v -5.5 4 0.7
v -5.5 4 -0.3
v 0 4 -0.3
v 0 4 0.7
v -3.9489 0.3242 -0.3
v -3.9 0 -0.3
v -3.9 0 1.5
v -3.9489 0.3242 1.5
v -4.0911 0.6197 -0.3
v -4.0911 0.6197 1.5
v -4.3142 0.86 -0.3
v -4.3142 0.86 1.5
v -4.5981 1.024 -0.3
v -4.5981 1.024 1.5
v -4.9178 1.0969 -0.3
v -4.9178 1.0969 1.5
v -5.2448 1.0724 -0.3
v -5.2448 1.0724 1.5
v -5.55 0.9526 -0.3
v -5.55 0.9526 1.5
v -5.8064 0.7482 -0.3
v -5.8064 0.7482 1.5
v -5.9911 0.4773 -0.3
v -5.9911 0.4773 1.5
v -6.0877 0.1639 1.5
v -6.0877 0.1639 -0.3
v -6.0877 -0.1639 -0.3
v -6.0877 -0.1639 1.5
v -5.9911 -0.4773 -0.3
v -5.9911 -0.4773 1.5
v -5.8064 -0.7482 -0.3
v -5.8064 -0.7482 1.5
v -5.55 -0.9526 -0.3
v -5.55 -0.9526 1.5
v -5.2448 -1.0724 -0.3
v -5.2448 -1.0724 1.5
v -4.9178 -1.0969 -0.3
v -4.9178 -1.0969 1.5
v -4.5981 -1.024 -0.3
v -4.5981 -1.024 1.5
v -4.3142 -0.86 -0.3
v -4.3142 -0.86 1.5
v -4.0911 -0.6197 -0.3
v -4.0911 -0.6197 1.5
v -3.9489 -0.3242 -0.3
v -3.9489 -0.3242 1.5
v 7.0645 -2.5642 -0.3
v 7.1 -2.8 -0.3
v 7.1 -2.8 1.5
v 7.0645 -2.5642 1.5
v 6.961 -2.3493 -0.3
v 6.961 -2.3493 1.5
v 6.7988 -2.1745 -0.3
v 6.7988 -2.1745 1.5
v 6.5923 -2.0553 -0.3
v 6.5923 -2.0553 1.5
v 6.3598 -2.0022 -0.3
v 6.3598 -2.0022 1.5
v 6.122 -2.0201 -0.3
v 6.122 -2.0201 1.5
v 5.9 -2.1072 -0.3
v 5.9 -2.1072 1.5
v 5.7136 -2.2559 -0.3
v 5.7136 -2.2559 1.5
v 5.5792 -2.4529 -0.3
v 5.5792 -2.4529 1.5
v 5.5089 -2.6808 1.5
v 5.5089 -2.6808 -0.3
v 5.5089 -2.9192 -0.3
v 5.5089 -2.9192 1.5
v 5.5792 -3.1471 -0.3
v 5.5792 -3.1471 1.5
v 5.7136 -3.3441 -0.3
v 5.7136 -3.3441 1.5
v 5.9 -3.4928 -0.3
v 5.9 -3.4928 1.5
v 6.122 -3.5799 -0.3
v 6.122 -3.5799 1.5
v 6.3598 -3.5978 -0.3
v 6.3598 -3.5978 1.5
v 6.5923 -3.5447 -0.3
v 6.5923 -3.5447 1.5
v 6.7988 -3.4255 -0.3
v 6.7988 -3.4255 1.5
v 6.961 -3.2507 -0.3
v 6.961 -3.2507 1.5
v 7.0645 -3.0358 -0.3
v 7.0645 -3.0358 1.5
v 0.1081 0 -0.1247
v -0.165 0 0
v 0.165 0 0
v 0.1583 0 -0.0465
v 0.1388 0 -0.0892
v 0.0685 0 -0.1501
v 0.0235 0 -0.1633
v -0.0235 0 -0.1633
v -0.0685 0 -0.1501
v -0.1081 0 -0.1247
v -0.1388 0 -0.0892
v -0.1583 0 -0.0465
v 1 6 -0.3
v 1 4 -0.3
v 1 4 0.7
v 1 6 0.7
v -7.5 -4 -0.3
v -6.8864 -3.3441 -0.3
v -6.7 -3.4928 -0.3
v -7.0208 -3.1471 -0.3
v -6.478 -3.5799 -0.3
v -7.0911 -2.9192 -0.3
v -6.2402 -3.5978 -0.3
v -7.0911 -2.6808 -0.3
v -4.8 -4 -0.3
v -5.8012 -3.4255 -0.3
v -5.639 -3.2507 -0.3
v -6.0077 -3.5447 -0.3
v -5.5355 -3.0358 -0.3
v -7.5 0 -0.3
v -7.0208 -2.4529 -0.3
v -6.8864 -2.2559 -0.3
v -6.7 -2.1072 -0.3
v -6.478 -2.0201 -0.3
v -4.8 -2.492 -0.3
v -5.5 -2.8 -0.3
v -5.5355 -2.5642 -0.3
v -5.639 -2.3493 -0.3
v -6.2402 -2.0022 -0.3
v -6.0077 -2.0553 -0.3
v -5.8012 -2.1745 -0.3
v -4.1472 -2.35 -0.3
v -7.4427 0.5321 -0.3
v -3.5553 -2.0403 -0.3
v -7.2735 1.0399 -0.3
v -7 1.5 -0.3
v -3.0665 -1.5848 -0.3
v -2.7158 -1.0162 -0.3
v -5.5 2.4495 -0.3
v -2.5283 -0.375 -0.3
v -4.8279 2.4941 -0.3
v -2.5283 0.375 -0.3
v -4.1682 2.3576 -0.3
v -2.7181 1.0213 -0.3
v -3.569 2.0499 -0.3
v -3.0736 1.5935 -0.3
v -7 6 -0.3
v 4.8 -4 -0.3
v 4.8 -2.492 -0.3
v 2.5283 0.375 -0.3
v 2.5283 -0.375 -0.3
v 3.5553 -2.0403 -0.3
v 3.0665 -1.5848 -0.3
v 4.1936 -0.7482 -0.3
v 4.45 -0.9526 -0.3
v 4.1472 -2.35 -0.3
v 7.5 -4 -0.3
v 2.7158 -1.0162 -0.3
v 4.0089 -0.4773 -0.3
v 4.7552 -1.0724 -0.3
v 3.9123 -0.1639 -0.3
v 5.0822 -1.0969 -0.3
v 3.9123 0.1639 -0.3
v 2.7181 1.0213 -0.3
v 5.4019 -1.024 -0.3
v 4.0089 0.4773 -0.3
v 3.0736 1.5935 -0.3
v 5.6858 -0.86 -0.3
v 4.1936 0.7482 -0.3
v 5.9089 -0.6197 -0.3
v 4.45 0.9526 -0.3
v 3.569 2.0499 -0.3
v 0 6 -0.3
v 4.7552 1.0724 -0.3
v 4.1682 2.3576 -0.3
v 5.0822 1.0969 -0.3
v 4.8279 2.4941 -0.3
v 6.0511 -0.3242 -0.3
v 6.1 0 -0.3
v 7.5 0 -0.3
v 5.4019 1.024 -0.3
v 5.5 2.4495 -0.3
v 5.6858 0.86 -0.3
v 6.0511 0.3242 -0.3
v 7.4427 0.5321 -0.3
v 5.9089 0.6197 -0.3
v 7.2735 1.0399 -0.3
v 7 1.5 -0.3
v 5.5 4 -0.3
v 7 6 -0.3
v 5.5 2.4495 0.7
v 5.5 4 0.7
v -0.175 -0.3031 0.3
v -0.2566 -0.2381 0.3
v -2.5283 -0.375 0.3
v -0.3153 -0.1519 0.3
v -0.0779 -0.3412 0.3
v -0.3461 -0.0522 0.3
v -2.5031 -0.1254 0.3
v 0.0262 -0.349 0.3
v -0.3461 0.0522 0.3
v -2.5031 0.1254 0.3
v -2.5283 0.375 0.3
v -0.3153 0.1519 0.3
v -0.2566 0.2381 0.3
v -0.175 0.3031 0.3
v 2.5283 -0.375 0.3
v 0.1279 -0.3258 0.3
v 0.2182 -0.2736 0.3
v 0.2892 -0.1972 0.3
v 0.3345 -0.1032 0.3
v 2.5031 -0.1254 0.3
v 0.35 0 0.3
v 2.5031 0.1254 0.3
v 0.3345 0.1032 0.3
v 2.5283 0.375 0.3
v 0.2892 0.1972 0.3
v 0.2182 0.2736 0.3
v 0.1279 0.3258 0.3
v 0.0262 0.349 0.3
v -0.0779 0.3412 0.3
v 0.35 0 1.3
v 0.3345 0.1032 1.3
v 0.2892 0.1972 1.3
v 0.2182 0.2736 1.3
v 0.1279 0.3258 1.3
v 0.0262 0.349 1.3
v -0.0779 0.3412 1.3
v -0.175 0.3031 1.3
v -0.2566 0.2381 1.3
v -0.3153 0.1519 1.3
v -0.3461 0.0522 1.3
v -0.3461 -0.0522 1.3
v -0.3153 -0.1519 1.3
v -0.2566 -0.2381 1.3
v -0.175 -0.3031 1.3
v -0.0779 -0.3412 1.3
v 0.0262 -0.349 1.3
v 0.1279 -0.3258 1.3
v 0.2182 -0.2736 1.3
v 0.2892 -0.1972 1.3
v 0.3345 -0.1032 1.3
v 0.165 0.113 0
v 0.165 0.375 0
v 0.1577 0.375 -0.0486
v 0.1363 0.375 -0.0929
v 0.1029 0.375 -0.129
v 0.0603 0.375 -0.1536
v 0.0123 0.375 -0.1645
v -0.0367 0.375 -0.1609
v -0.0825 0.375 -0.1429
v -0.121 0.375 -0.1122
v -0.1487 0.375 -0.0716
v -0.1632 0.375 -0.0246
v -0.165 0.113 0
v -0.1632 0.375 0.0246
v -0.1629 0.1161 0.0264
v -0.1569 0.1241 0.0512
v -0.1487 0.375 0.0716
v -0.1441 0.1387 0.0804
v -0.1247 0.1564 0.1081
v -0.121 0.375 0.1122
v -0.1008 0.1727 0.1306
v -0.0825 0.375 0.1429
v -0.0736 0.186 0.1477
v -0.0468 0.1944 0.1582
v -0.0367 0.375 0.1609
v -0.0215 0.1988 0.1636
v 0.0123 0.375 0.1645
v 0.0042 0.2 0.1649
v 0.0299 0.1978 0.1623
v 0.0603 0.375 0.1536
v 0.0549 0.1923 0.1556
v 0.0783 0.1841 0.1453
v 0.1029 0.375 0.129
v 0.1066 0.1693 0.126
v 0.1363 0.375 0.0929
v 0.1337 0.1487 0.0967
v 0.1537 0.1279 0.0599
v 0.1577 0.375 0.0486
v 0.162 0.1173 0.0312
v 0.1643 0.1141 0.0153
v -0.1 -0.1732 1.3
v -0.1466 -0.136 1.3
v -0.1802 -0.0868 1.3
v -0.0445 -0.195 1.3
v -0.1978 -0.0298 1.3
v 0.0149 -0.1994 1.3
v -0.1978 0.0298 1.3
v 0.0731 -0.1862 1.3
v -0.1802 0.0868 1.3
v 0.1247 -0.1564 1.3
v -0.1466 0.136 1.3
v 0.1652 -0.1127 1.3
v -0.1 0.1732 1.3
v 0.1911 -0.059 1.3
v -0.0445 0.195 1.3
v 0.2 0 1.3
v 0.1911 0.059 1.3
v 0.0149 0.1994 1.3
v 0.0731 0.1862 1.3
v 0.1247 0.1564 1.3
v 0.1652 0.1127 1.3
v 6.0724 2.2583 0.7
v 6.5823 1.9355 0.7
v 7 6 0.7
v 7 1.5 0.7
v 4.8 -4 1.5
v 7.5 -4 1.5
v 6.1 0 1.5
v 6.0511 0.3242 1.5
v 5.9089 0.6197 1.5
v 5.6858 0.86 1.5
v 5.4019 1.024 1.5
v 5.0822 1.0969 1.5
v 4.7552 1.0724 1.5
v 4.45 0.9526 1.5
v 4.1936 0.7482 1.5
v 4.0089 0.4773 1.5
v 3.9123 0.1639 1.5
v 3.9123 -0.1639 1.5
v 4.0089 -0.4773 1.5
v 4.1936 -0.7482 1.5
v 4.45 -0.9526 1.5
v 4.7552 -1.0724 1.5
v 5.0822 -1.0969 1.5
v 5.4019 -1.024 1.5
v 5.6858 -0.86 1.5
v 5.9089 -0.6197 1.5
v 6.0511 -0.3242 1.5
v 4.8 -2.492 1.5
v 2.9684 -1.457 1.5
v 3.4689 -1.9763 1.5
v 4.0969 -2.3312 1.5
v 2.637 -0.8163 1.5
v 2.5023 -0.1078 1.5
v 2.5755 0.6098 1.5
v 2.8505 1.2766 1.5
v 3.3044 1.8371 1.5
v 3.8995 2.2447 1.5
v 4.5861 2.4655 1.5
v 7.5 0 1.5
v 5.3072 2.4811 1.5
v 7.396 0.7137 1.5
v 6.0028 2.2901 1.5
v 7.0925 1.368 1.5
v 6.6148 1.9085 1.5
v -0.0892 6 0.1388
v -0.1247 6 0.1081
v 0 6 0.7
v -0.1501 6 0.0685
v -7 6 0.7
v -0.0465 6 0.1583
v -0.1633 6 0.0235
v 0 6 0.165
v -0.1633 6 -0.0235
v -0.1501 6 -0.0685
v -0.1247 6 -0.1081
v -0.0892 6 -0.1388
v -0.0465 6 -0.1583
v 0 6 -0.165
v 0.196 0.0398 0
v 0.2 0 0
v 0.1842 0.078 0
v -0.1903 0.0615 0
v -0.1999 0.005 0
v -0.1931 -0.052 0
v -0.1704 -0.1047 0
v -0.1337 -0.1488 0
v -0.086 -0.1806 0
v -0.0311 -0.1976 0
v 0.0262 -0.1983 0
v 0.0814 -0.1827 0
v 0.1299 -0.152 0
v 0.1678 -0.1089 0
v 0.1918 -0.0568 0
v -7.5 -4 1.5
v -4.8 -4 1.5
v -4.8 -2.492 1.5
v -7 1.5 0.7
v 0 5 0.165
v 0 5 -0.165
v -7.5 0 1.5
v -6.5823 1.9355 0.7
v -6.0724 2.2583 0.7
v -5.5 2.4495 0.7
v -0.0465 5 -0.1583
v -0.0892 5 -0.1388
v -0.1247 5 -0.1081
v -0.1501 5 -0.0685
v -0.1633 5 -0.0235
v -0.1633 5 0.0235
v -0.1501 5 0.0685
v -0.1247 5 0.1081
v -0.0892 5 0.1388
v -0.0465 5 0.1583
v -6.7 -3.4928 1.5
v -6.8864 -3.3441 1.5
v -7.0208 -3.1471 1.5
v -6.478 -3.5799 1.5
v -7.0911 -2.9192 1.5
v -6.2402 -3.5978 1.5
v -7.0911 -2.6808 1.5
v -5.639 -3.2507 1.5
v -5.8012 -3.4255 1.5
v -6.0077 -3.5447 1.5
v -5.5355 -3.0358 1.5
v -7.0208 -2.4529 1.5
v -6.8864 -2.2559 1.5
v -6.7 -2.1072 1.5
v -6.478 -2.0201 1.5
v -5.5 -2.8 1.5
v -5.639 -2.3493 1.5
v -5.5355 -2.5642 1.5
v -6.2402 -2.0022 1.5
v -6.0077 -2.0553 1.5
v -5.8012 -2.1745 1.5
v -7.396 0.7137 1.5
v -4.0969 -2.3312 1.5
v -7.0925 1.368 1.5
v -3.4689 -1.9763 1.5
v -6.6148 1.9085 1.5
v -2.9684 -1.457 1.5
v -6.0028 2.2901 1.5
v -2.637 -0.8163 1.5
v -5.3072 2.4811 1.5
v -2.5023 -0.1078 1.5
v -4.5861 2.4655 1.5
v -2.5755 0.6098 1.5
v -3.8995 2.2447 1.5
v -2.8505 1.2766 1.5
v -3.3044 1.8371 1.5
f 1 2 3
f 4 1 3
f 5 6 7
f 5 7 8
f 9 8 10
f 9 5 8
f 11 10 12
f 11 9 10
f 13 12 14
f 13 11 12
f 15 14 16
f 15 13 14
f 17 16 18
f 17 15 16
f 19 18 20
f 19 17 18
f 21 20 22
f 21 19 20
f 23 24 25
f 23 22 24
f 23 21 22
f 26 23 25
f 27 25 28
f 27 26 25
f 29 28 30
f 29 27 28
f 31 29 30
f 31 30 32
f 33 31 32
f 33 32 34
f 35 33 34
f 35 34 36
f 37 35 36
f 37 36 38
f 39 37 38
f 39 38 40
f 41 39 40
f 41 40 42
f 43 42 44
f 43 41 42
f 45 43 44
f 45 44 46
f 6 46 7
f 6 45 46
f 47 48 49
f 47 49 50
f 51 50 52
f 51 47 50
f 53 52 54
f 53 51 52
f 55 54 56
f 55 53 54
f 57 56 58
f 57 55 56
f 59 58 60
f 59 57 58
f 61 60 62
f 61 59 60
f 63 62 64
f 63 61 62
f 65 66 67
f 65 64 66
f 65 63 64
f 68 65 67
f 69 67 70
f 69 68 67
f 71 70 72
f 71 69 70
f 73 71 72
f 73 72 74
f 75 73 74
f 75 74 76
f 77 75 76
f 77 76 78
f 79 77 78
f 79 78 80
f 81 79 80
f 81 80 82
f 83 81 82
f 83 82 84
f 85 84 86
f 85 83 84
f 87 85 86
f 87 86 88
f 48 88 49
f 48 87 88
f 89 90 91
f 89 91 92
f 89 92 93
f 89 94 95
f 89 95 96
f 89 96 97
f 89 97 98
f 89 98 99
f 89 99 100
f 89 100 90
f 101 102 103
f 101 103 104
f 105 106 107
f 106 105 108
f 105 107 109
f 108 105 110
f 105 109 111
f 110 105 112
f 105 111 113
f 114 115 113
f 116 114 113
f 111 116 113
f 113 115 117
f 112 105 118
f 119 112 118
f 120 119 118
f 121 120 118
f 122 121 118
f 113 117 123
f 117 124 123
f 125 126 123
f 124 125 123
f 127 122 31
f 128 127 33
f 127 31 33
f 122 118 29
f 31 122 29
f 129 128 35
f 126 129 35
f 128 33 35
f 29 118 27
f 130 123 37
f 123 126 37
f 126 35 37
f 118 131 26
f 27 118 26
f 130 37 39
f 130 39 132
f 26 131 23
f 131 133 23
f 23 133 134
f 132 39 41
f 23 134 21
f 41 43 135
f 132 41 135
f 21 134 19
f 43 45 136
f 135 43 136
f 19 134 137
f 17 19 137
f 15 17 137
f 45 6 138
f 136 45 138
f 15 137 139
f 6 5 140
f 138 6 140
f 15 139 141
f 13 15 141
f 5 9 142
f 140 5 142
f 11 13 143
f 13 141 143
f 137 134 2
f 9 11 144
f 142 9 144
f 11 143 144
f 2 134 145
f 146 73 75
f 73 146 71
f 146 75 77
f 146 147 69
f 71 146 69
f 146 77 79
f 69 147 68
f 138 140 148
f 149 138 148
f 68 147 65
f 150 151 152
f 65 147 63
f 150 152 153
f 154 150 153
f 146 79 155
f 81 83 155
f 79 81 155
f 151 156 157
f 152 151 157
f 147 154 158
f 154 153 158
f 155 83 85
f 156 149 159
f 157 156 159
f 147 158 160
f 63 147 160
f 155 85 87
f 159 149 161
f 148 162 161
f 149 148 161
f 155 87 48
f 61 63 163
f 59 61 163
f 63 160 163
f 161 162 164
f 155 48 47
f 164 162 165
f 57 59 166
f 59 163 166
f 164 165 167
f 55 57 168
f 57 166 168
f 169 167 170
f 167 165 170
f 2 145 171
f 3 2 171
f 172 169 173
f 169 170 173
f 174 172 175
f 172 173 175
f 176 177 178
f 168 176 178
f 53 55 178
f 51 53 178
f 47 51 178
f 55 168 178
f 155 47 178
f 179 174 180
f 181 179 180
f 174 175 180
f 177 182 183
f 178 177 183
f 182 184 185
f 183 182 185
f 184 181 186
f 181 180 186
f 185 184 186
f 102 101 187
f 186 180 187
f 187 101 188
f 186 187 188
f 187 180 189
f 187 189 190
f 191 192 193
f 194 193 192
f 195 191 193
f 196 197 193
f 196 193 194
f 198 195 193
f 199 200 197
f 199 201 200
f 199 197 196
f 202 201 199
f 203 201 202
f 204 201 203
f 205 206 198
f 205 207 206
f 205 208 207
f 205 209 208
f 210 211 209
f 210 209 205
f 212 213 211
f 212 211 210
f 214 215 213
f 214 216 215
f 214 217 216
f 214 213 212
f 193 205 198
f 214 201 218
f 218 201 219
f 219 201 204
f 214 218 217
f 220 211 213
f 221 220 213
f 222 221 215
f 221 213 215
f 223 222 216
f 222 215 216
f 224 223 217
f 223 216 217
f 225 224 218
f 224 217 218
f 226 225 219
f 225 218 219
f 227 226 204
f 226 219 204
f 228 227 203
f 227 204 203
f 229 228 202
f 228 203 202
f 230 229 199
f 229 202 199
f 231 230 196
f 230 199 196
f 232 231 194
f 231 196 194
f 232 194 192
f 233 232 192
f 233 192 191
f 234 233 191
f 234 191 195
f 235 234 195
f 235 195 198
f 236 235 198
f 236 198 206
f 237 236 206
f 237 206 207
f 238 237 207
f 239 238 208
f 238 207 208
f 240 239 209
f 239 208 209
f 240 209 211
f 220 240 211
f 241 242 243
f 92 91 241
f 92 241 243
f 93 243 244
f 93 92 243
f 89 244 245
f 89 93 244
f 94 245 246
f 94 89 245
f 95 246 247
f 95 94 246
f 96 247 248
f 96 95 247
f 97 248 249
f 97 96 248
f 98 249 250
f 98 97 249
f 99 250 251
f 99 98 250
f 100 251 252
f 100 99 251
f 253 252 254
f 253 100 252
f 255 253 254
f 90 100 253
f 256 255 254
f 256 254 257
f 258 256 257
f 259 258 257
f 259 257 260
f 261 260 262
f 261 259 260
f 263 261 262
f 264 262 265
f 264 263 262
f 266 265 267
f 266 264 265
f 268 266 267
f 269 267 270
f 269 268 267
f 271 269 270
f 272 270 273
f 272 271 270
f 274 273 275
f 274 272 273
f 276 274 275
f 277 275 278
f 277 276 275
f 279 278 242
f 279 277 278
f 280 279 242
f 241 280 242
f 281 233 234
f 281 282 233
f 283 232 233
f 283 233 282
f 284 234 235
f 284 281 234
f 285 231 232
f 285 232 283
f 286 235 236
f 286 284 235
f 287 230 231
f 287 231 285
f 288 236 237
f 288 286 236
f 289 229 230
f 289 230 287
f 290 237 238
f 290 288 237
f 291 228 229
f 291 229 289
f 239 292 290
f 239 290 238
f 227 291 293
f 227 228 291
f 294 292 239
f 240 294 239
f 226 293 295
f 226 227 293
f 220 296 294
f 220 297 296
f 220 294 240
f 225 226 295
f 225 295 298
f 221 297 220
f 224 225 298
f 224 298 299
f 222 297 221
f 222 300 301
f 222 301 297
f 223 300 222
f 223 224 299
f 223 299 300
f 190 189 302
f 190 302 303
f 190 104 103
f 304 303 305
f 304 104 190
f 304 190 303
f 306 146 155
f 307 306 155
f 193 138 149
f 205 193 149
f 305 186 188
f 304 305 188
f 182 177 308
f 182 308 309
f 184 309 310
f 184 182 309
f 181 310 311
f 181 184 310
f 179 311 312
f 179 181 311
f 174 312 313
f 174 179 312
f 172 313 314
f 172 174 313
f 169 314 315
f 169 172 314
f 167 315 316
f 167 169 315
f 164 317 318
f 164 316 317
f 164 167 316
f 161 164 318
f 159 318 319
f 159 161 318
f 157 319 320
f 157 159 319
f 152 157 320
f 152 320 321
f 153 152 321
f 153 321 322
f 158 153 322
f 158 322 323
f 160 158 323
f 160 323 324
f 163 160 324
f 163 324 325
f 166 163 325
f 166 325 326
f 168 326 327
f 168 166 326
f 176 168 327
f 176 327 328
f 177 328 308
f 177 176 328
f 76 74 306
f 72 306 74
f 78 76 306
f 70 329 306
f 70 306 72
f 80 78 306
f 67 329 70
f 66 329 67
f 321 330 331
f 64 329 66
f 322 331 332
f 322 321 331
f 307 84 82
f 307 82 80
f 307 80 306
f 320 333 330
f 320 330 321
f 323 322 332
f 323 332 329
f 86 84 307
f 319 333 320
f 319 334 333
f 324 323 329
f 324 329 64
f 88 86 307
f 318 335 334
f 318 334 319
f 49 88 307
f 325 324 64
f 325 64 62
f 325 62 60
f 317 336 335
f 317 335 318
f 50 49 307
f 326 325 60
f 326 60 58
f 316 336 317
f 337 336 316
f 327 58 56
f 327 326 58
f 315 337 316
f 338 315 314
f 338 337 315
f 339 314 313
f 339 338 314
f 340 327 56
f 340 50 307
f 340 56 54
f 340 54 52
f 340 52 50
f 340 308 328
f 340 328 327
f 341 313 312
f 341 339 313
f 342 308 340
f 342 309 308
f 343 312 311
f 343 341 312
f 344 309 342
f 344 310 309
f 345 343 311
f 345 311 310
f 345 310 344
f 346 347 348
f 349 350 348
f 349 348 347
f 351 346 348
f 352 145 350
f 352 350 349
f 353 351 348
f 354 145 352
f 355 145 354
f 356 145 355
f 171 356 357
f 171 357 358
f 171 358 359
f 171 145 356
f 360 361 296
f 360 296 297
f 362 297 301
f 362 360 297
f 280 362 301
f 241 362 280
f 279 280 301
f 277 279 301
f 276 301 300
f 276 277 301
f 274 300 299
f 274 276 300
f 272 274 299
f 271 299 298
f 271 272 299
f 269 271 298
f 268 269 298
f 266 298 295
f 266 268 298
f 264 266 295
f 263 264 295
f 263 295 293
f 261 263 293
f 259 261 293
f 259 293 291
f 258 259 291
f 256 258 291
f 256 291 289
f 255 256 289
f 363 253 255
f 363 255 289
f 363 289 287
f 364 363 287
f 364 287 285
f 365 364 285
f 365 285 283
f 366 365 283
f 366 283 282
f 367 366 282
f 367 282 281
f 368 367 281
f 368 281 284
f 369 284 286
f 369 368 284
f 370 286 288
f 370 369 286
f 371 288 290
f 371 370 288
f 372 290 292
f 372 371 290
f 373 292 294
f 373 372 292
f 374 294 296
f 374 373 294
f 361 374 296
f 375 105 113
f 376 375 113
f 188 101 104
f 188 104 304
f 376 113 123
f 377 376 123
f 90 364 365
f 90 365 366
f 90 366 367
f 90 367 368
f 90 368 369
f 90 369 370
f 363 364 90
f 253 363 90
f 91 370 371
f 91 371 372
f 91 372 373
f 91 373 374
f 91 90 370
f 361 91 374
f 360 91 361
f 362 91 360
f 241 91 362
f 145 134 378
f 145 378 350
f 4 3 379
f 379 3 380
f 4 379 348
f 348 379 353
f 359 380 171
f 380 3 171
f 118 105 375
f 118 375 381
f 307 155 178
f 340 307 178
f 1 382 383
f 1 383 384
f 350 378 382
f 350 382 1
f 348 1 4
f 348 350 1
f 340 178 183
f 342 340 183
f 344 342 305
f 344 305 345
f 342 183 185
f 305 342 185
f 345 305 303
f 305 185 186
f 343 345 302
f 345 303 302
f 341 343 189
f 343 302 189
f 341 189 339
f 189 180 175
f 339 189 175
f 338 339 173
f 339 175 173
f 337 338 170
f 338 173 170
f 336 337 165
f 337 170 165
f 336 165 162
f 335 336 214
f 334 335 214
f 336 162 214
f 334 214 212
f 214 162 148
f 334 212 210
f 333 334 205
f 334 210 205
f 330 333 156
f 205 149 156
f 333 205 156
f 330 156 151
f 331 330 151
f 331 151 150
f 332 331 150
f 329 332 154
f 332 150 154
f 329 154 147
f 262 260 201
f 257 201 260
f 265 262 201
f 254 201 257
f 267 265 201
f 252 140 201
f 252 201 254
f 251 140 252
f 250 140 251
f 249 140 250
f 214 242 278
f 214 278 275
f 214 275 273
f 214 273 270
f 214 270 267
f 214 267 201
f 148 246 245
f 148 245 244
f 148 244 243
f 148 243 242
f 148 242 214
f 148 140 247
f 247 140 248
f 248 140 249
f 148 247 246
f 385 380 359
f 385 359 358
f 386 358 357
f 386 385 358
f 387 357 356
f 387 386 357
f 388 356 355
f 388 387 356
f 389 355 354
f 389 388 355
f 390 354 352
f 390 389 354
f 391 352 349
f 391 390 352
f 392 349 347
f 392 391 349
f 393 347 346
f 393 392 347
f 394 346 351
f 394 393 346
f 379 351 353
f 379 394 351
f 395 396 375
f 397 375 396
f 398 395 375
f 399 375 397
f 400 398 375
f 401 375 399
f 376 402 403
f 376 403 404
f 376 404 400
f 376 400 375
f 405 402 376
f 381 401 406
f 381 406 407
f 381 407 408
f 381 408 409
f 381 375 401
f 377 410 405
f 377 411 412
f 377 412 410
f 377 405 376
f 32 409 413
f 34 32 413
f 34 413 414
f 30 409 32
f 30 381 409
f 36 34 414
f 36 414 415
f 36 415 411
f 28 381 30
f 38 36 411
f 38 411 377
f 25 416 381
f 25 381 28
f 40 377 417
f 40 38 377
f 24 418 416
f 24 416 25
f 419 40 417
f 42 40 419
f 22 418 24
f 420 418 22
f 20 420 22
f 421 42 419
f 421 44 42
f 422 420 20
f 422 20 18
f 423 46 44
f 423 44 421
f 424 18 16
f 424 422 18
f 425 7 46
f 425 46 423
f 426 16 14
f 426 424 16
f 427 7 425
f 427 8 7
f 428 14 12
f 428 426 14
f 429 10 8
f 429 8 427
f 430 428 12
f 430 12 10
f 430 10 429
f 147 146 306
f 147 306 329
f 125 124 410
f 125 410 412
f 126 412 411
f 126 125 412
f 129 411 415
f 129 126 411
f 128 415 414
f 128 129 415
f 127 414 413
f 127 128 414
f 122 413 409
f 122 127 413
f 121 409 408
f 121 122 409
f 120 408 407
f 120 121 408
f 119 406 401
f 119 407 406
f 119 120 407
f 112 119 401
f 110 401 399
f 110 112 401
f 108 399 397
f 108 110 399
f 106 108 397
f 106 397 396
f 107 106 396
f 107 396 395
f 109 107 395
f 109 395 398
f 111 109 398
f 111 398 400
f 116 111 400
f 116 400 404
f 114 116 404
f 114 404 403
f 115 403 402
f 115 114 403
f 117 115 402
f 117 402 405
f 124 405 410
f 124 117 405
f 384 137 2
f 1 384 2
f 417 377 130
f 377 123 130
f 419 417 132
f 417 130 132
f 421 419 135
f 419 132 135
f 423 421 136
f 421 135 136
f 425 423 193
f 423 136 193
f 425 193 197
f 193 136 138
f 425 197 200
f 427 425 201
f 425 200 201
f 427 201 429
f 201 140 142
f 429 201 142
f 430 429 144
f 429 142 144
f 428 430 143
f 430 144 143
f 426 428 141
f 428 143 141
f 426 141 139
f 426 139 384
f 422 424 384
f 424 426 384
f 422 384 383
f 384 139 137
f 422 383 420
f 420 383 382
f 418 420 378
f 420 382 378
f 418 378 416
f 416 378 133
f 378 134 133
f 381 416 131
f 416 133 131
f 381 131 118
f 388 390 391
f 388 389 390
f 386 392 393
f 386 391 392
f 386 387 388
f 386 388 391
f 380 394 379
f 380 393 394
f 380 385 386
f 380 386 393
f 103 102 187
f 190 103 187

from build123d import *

# Parameters (mm, degrees)
BOX006_W          = 1
BOX006_H          = 6
BOX006_DEPTH      = 4
BOX005_W          = 9
BOX005_H          = 1
BOX005_DEPTH      = 1
CYLINDER144_R     = 0.8
CYLINDER144_DEPTH = 10
CYLINDER136_R     = 0.2
CYLINDER136_DEPTH = 9
CYLINDER_R        = 1.1
CYLINDER_DEPTH    = 4
CYLINDER139_R     = 1.1
CYLINDER139_DEPTH = 4
CYLINDER138_R     = 0.165
CYLINDER138_DEPTH = 8
CYLINDER143_R     = 0.8
CYLINDER143_DEPTH = 10
BOX003_W          = 2.7
BOX003_H          = 4
BOX003_DEPTH      = 1.8
BOX004_W          = 2.7
BOX004_H          = 4
BOX004_DEPTH      = 1.8
CYLINDER142_R     = 2.5
CYLINDER142_DEPTH = 1.8
CYLINDER141_R     = 2.5
CYLINDER141_DEPTH = 1.8
CYLINDER140_R     = 0.35
CYLINDER140_DEPTH = 1
BOX_W             = 10
BOX_H             = 0.75
BOX_DEPTH         = 0.6
BOX002_W          = 11
BOX002_H          = 4
BOX002_DEPTH      = 1
BOX001_W          = 14
BOX001_H          = 6
BOX001_DEPTH      = 1


with BuildPart() as cube003:
    # Box006 → Box006 (new body)
    with BuildSketch(Plane(origin=(0, 3, -1), x_dir=(1, 0, 0), z_dir=(0, 0, 1))):
        with Locations((0.5, 3)):
            Rectangle(BOX006_W, BOX006_H)
    extrude(amount=BOX006_DEPTH)


with BuildPart() as cube002:
    # Box005 → Box005 (new body)
    with BuildSketch(Plane(origin=(-5, 4, -0.3), x_dir=(1, 0, 0), z_dir=(0, 0, 1))):
        with Locations((4.5, 0.5)):
            Rectangle(BOX005_W, BOX005_H)
    extrude(amount=BOX005_DEPTH)


with BuildPart() as cylinder001:
    # Cylinder144 → Cylinder144 (new body)
    with BuildSketch(Plane(origin=(6.3, -2.8, -1), x_dir=(1, 0, 0), z_dir=(0, 0, 1))):
        Circle(CYLINDER144_R)
    extrude(amount=CYLINDER144_DEPTH)


with BuildPart() as bowtienozzle:
    # Cylinder136 → Cylinder136 (new body)
    with BuildSketch(Plane.XY):
        Circle(CYLINDER136_R)
    extrude(amount=CYLINDER136_DEPTH)


with BuildPart() as mountinghole1:
    # Cylinder → Cylinder (new body)
    with BuildSketch(Plane(origin=(-5, 0, -1), x_dir=(1, 0, 0), z_dir=(0, 0, 1))):
        Circle(CYLINDER_R)
    extrude(amount=CYLINDER_DEPTH)


with BuildPart() as mountinghole2:
    # Cylinder139 → Cylinder139 (new body)
    with BuildSketch(Plane(origin=(5, 0, -1), x_dir=(1, 0, 0), z_dir=(0, 0, 1))):
        Circle(CYLINDER139_R)
    extrude(amount=CYLINDER139_DEPTH)


with BuildPart() as fusion001:
    # Cylinder138 → Cylinder138 (new body)
    with BuildSketch(Plane(origin=(0, 0, 0), x_dir=(1, 0, 0), z_dir=(0, 1, 0))):
        Circle(CYLINDER138_R)
    extrude(amount=CYLINDER138_DEPTH)

    # Fusion001: union BowTieNozzle, MountingHole1, MountingHole2
    add(bowtienozzle.part)
    add(mountinghole1.part)
    add(mountinghole2.part)


with BuildPart() as fusion003:
    # Cylinder143 → Cylinder143 (new body)
    with BuildSketch(Plane(origin=(-6.3, -2.8, -1), x_dir=(1, 0, 0), z_dir=(0, 0, 1))):
        Circle(CYLINDER143_R)
    extrude(amount=CYLINDER143_DEPTH)

    # Fusion003: union Cylinder001, Fusion001
    add(cylinder001.part)
    add(fusion001.part)


with BuildPart() as cube:
    # Box003 → Box003 (new body)
    with BuildSketch(Plane(origin=(4.8, -4, -0.3), x_dir=(1, 0, 0), z_dir=(0, 0, 1))):
        with Locations((1.35, 2)):
            Rectangle(BOX003_W, BOX003_H)
    extrude(amount=BOX003_DEPTH)


with BuildPart() as cube001:
    # Box004 → Box004 (new body)
    with BuildSketch(Plane(origin=(-7.5, -4, -0.3), x_dir=(1, 0, 0), z_dir=(0, 0, 1))):
        with Locations((1.35, 2)):
            Rectangle(BOX004_W, BOX004_H)
    extrude(amount=BOX004_DEPTH)


with BuildPart() as mountingholeod001:
    # Cylinder142 → Cylinder142 (new body)
    with BuildSketch(Plane(origin=(5, 0, -0.3), x_dir=(1, 0, 0), z_dir=(0, 0, 1))):
        Circle(CYLINDER142_R)
    extrude(amount=CYLINDER142_DEPTH)


with BuildPart() as mountingholeod:
    # Cylinder141 → Cylinder141 (new body)
    with BuildSketch(Plane(origin=(-5, 0, -0.3), x_dir=(1, 0, 0), z_dir=(0, 0, 1))):
        Circle(CYLINDER141_R)
    extrude(amount=CYLINDER141_DEPTH)


with BuildPart() as nozzle_od:
    # Cylinder140 → Cylinder140 (new body)
    with BuildSketch(Plane.XY.offset(0.3)):
        Circle(CYLINDER140_R)
    extrude(amount=CYLINDER140_DEPTH)


with BuildPart() as fusion:
    # Box → Box (new body)
    with BuildSketch(Plane(origin=(-5, -0.375, -0.3), x_dir=(1, 0, 0), z_dir=(0, 0, 1))):
        with Locations((5, 0.375)):
            Rectangle(BOX_W, BOX_H)
    extrude(amount=BOX_DEPTH)

    # Fusion: union MountingHoleOD001, MountingHoleOD, Nozzle_OD
    add(mountingholeod001.part)
    add(mountingholeod.part)
    add(nozzle_od.part)


with BuildPart() as supportsubtract:
    # Box002 → Box002 (new body)
    with BuildSketch(Plane(origin=(-5.5, 0, -0.3), x_dir=(1, 0, 0), z_dir=(0, 0, 1))):
        with Locations((5.5, 2)):
            Rectangle(BOX002_W, BOX002_H)
    extrude(amount=BOX002_DEPTH)


with BuildPart() as cut002:
    # Box001 → Box001 (new body)
    with BuildSketch(Plane(origin=(-7, 0, -0.3), x_dir=(1, 0, 0), z_dir=(0, 0, 1))):
        with Locations((7, 3)):
            Rectangle(BOX001_W, BOX001_H)
    extrude(amount=BOX001_DEPTH)

    # Cut: cut SupportSubtract
    add(supportsubtract.part, mode=Mode.SUBTRACT)

    # Fusion002: union Cube, Cube001, Fusion
    add(cube.part)
    add(cube001.part)
    add(fusion.part)

    # Cut001: cut Fusion003
    add(fusion003.part, mode=Mode.SUBTRACT)

    # Fusion004: union Cube002
    add(cube002.part)

    # Cut002: cut Cube003
    add(cube003.part, mode=Mode.SUBTRACT)


solid = cut002.part
